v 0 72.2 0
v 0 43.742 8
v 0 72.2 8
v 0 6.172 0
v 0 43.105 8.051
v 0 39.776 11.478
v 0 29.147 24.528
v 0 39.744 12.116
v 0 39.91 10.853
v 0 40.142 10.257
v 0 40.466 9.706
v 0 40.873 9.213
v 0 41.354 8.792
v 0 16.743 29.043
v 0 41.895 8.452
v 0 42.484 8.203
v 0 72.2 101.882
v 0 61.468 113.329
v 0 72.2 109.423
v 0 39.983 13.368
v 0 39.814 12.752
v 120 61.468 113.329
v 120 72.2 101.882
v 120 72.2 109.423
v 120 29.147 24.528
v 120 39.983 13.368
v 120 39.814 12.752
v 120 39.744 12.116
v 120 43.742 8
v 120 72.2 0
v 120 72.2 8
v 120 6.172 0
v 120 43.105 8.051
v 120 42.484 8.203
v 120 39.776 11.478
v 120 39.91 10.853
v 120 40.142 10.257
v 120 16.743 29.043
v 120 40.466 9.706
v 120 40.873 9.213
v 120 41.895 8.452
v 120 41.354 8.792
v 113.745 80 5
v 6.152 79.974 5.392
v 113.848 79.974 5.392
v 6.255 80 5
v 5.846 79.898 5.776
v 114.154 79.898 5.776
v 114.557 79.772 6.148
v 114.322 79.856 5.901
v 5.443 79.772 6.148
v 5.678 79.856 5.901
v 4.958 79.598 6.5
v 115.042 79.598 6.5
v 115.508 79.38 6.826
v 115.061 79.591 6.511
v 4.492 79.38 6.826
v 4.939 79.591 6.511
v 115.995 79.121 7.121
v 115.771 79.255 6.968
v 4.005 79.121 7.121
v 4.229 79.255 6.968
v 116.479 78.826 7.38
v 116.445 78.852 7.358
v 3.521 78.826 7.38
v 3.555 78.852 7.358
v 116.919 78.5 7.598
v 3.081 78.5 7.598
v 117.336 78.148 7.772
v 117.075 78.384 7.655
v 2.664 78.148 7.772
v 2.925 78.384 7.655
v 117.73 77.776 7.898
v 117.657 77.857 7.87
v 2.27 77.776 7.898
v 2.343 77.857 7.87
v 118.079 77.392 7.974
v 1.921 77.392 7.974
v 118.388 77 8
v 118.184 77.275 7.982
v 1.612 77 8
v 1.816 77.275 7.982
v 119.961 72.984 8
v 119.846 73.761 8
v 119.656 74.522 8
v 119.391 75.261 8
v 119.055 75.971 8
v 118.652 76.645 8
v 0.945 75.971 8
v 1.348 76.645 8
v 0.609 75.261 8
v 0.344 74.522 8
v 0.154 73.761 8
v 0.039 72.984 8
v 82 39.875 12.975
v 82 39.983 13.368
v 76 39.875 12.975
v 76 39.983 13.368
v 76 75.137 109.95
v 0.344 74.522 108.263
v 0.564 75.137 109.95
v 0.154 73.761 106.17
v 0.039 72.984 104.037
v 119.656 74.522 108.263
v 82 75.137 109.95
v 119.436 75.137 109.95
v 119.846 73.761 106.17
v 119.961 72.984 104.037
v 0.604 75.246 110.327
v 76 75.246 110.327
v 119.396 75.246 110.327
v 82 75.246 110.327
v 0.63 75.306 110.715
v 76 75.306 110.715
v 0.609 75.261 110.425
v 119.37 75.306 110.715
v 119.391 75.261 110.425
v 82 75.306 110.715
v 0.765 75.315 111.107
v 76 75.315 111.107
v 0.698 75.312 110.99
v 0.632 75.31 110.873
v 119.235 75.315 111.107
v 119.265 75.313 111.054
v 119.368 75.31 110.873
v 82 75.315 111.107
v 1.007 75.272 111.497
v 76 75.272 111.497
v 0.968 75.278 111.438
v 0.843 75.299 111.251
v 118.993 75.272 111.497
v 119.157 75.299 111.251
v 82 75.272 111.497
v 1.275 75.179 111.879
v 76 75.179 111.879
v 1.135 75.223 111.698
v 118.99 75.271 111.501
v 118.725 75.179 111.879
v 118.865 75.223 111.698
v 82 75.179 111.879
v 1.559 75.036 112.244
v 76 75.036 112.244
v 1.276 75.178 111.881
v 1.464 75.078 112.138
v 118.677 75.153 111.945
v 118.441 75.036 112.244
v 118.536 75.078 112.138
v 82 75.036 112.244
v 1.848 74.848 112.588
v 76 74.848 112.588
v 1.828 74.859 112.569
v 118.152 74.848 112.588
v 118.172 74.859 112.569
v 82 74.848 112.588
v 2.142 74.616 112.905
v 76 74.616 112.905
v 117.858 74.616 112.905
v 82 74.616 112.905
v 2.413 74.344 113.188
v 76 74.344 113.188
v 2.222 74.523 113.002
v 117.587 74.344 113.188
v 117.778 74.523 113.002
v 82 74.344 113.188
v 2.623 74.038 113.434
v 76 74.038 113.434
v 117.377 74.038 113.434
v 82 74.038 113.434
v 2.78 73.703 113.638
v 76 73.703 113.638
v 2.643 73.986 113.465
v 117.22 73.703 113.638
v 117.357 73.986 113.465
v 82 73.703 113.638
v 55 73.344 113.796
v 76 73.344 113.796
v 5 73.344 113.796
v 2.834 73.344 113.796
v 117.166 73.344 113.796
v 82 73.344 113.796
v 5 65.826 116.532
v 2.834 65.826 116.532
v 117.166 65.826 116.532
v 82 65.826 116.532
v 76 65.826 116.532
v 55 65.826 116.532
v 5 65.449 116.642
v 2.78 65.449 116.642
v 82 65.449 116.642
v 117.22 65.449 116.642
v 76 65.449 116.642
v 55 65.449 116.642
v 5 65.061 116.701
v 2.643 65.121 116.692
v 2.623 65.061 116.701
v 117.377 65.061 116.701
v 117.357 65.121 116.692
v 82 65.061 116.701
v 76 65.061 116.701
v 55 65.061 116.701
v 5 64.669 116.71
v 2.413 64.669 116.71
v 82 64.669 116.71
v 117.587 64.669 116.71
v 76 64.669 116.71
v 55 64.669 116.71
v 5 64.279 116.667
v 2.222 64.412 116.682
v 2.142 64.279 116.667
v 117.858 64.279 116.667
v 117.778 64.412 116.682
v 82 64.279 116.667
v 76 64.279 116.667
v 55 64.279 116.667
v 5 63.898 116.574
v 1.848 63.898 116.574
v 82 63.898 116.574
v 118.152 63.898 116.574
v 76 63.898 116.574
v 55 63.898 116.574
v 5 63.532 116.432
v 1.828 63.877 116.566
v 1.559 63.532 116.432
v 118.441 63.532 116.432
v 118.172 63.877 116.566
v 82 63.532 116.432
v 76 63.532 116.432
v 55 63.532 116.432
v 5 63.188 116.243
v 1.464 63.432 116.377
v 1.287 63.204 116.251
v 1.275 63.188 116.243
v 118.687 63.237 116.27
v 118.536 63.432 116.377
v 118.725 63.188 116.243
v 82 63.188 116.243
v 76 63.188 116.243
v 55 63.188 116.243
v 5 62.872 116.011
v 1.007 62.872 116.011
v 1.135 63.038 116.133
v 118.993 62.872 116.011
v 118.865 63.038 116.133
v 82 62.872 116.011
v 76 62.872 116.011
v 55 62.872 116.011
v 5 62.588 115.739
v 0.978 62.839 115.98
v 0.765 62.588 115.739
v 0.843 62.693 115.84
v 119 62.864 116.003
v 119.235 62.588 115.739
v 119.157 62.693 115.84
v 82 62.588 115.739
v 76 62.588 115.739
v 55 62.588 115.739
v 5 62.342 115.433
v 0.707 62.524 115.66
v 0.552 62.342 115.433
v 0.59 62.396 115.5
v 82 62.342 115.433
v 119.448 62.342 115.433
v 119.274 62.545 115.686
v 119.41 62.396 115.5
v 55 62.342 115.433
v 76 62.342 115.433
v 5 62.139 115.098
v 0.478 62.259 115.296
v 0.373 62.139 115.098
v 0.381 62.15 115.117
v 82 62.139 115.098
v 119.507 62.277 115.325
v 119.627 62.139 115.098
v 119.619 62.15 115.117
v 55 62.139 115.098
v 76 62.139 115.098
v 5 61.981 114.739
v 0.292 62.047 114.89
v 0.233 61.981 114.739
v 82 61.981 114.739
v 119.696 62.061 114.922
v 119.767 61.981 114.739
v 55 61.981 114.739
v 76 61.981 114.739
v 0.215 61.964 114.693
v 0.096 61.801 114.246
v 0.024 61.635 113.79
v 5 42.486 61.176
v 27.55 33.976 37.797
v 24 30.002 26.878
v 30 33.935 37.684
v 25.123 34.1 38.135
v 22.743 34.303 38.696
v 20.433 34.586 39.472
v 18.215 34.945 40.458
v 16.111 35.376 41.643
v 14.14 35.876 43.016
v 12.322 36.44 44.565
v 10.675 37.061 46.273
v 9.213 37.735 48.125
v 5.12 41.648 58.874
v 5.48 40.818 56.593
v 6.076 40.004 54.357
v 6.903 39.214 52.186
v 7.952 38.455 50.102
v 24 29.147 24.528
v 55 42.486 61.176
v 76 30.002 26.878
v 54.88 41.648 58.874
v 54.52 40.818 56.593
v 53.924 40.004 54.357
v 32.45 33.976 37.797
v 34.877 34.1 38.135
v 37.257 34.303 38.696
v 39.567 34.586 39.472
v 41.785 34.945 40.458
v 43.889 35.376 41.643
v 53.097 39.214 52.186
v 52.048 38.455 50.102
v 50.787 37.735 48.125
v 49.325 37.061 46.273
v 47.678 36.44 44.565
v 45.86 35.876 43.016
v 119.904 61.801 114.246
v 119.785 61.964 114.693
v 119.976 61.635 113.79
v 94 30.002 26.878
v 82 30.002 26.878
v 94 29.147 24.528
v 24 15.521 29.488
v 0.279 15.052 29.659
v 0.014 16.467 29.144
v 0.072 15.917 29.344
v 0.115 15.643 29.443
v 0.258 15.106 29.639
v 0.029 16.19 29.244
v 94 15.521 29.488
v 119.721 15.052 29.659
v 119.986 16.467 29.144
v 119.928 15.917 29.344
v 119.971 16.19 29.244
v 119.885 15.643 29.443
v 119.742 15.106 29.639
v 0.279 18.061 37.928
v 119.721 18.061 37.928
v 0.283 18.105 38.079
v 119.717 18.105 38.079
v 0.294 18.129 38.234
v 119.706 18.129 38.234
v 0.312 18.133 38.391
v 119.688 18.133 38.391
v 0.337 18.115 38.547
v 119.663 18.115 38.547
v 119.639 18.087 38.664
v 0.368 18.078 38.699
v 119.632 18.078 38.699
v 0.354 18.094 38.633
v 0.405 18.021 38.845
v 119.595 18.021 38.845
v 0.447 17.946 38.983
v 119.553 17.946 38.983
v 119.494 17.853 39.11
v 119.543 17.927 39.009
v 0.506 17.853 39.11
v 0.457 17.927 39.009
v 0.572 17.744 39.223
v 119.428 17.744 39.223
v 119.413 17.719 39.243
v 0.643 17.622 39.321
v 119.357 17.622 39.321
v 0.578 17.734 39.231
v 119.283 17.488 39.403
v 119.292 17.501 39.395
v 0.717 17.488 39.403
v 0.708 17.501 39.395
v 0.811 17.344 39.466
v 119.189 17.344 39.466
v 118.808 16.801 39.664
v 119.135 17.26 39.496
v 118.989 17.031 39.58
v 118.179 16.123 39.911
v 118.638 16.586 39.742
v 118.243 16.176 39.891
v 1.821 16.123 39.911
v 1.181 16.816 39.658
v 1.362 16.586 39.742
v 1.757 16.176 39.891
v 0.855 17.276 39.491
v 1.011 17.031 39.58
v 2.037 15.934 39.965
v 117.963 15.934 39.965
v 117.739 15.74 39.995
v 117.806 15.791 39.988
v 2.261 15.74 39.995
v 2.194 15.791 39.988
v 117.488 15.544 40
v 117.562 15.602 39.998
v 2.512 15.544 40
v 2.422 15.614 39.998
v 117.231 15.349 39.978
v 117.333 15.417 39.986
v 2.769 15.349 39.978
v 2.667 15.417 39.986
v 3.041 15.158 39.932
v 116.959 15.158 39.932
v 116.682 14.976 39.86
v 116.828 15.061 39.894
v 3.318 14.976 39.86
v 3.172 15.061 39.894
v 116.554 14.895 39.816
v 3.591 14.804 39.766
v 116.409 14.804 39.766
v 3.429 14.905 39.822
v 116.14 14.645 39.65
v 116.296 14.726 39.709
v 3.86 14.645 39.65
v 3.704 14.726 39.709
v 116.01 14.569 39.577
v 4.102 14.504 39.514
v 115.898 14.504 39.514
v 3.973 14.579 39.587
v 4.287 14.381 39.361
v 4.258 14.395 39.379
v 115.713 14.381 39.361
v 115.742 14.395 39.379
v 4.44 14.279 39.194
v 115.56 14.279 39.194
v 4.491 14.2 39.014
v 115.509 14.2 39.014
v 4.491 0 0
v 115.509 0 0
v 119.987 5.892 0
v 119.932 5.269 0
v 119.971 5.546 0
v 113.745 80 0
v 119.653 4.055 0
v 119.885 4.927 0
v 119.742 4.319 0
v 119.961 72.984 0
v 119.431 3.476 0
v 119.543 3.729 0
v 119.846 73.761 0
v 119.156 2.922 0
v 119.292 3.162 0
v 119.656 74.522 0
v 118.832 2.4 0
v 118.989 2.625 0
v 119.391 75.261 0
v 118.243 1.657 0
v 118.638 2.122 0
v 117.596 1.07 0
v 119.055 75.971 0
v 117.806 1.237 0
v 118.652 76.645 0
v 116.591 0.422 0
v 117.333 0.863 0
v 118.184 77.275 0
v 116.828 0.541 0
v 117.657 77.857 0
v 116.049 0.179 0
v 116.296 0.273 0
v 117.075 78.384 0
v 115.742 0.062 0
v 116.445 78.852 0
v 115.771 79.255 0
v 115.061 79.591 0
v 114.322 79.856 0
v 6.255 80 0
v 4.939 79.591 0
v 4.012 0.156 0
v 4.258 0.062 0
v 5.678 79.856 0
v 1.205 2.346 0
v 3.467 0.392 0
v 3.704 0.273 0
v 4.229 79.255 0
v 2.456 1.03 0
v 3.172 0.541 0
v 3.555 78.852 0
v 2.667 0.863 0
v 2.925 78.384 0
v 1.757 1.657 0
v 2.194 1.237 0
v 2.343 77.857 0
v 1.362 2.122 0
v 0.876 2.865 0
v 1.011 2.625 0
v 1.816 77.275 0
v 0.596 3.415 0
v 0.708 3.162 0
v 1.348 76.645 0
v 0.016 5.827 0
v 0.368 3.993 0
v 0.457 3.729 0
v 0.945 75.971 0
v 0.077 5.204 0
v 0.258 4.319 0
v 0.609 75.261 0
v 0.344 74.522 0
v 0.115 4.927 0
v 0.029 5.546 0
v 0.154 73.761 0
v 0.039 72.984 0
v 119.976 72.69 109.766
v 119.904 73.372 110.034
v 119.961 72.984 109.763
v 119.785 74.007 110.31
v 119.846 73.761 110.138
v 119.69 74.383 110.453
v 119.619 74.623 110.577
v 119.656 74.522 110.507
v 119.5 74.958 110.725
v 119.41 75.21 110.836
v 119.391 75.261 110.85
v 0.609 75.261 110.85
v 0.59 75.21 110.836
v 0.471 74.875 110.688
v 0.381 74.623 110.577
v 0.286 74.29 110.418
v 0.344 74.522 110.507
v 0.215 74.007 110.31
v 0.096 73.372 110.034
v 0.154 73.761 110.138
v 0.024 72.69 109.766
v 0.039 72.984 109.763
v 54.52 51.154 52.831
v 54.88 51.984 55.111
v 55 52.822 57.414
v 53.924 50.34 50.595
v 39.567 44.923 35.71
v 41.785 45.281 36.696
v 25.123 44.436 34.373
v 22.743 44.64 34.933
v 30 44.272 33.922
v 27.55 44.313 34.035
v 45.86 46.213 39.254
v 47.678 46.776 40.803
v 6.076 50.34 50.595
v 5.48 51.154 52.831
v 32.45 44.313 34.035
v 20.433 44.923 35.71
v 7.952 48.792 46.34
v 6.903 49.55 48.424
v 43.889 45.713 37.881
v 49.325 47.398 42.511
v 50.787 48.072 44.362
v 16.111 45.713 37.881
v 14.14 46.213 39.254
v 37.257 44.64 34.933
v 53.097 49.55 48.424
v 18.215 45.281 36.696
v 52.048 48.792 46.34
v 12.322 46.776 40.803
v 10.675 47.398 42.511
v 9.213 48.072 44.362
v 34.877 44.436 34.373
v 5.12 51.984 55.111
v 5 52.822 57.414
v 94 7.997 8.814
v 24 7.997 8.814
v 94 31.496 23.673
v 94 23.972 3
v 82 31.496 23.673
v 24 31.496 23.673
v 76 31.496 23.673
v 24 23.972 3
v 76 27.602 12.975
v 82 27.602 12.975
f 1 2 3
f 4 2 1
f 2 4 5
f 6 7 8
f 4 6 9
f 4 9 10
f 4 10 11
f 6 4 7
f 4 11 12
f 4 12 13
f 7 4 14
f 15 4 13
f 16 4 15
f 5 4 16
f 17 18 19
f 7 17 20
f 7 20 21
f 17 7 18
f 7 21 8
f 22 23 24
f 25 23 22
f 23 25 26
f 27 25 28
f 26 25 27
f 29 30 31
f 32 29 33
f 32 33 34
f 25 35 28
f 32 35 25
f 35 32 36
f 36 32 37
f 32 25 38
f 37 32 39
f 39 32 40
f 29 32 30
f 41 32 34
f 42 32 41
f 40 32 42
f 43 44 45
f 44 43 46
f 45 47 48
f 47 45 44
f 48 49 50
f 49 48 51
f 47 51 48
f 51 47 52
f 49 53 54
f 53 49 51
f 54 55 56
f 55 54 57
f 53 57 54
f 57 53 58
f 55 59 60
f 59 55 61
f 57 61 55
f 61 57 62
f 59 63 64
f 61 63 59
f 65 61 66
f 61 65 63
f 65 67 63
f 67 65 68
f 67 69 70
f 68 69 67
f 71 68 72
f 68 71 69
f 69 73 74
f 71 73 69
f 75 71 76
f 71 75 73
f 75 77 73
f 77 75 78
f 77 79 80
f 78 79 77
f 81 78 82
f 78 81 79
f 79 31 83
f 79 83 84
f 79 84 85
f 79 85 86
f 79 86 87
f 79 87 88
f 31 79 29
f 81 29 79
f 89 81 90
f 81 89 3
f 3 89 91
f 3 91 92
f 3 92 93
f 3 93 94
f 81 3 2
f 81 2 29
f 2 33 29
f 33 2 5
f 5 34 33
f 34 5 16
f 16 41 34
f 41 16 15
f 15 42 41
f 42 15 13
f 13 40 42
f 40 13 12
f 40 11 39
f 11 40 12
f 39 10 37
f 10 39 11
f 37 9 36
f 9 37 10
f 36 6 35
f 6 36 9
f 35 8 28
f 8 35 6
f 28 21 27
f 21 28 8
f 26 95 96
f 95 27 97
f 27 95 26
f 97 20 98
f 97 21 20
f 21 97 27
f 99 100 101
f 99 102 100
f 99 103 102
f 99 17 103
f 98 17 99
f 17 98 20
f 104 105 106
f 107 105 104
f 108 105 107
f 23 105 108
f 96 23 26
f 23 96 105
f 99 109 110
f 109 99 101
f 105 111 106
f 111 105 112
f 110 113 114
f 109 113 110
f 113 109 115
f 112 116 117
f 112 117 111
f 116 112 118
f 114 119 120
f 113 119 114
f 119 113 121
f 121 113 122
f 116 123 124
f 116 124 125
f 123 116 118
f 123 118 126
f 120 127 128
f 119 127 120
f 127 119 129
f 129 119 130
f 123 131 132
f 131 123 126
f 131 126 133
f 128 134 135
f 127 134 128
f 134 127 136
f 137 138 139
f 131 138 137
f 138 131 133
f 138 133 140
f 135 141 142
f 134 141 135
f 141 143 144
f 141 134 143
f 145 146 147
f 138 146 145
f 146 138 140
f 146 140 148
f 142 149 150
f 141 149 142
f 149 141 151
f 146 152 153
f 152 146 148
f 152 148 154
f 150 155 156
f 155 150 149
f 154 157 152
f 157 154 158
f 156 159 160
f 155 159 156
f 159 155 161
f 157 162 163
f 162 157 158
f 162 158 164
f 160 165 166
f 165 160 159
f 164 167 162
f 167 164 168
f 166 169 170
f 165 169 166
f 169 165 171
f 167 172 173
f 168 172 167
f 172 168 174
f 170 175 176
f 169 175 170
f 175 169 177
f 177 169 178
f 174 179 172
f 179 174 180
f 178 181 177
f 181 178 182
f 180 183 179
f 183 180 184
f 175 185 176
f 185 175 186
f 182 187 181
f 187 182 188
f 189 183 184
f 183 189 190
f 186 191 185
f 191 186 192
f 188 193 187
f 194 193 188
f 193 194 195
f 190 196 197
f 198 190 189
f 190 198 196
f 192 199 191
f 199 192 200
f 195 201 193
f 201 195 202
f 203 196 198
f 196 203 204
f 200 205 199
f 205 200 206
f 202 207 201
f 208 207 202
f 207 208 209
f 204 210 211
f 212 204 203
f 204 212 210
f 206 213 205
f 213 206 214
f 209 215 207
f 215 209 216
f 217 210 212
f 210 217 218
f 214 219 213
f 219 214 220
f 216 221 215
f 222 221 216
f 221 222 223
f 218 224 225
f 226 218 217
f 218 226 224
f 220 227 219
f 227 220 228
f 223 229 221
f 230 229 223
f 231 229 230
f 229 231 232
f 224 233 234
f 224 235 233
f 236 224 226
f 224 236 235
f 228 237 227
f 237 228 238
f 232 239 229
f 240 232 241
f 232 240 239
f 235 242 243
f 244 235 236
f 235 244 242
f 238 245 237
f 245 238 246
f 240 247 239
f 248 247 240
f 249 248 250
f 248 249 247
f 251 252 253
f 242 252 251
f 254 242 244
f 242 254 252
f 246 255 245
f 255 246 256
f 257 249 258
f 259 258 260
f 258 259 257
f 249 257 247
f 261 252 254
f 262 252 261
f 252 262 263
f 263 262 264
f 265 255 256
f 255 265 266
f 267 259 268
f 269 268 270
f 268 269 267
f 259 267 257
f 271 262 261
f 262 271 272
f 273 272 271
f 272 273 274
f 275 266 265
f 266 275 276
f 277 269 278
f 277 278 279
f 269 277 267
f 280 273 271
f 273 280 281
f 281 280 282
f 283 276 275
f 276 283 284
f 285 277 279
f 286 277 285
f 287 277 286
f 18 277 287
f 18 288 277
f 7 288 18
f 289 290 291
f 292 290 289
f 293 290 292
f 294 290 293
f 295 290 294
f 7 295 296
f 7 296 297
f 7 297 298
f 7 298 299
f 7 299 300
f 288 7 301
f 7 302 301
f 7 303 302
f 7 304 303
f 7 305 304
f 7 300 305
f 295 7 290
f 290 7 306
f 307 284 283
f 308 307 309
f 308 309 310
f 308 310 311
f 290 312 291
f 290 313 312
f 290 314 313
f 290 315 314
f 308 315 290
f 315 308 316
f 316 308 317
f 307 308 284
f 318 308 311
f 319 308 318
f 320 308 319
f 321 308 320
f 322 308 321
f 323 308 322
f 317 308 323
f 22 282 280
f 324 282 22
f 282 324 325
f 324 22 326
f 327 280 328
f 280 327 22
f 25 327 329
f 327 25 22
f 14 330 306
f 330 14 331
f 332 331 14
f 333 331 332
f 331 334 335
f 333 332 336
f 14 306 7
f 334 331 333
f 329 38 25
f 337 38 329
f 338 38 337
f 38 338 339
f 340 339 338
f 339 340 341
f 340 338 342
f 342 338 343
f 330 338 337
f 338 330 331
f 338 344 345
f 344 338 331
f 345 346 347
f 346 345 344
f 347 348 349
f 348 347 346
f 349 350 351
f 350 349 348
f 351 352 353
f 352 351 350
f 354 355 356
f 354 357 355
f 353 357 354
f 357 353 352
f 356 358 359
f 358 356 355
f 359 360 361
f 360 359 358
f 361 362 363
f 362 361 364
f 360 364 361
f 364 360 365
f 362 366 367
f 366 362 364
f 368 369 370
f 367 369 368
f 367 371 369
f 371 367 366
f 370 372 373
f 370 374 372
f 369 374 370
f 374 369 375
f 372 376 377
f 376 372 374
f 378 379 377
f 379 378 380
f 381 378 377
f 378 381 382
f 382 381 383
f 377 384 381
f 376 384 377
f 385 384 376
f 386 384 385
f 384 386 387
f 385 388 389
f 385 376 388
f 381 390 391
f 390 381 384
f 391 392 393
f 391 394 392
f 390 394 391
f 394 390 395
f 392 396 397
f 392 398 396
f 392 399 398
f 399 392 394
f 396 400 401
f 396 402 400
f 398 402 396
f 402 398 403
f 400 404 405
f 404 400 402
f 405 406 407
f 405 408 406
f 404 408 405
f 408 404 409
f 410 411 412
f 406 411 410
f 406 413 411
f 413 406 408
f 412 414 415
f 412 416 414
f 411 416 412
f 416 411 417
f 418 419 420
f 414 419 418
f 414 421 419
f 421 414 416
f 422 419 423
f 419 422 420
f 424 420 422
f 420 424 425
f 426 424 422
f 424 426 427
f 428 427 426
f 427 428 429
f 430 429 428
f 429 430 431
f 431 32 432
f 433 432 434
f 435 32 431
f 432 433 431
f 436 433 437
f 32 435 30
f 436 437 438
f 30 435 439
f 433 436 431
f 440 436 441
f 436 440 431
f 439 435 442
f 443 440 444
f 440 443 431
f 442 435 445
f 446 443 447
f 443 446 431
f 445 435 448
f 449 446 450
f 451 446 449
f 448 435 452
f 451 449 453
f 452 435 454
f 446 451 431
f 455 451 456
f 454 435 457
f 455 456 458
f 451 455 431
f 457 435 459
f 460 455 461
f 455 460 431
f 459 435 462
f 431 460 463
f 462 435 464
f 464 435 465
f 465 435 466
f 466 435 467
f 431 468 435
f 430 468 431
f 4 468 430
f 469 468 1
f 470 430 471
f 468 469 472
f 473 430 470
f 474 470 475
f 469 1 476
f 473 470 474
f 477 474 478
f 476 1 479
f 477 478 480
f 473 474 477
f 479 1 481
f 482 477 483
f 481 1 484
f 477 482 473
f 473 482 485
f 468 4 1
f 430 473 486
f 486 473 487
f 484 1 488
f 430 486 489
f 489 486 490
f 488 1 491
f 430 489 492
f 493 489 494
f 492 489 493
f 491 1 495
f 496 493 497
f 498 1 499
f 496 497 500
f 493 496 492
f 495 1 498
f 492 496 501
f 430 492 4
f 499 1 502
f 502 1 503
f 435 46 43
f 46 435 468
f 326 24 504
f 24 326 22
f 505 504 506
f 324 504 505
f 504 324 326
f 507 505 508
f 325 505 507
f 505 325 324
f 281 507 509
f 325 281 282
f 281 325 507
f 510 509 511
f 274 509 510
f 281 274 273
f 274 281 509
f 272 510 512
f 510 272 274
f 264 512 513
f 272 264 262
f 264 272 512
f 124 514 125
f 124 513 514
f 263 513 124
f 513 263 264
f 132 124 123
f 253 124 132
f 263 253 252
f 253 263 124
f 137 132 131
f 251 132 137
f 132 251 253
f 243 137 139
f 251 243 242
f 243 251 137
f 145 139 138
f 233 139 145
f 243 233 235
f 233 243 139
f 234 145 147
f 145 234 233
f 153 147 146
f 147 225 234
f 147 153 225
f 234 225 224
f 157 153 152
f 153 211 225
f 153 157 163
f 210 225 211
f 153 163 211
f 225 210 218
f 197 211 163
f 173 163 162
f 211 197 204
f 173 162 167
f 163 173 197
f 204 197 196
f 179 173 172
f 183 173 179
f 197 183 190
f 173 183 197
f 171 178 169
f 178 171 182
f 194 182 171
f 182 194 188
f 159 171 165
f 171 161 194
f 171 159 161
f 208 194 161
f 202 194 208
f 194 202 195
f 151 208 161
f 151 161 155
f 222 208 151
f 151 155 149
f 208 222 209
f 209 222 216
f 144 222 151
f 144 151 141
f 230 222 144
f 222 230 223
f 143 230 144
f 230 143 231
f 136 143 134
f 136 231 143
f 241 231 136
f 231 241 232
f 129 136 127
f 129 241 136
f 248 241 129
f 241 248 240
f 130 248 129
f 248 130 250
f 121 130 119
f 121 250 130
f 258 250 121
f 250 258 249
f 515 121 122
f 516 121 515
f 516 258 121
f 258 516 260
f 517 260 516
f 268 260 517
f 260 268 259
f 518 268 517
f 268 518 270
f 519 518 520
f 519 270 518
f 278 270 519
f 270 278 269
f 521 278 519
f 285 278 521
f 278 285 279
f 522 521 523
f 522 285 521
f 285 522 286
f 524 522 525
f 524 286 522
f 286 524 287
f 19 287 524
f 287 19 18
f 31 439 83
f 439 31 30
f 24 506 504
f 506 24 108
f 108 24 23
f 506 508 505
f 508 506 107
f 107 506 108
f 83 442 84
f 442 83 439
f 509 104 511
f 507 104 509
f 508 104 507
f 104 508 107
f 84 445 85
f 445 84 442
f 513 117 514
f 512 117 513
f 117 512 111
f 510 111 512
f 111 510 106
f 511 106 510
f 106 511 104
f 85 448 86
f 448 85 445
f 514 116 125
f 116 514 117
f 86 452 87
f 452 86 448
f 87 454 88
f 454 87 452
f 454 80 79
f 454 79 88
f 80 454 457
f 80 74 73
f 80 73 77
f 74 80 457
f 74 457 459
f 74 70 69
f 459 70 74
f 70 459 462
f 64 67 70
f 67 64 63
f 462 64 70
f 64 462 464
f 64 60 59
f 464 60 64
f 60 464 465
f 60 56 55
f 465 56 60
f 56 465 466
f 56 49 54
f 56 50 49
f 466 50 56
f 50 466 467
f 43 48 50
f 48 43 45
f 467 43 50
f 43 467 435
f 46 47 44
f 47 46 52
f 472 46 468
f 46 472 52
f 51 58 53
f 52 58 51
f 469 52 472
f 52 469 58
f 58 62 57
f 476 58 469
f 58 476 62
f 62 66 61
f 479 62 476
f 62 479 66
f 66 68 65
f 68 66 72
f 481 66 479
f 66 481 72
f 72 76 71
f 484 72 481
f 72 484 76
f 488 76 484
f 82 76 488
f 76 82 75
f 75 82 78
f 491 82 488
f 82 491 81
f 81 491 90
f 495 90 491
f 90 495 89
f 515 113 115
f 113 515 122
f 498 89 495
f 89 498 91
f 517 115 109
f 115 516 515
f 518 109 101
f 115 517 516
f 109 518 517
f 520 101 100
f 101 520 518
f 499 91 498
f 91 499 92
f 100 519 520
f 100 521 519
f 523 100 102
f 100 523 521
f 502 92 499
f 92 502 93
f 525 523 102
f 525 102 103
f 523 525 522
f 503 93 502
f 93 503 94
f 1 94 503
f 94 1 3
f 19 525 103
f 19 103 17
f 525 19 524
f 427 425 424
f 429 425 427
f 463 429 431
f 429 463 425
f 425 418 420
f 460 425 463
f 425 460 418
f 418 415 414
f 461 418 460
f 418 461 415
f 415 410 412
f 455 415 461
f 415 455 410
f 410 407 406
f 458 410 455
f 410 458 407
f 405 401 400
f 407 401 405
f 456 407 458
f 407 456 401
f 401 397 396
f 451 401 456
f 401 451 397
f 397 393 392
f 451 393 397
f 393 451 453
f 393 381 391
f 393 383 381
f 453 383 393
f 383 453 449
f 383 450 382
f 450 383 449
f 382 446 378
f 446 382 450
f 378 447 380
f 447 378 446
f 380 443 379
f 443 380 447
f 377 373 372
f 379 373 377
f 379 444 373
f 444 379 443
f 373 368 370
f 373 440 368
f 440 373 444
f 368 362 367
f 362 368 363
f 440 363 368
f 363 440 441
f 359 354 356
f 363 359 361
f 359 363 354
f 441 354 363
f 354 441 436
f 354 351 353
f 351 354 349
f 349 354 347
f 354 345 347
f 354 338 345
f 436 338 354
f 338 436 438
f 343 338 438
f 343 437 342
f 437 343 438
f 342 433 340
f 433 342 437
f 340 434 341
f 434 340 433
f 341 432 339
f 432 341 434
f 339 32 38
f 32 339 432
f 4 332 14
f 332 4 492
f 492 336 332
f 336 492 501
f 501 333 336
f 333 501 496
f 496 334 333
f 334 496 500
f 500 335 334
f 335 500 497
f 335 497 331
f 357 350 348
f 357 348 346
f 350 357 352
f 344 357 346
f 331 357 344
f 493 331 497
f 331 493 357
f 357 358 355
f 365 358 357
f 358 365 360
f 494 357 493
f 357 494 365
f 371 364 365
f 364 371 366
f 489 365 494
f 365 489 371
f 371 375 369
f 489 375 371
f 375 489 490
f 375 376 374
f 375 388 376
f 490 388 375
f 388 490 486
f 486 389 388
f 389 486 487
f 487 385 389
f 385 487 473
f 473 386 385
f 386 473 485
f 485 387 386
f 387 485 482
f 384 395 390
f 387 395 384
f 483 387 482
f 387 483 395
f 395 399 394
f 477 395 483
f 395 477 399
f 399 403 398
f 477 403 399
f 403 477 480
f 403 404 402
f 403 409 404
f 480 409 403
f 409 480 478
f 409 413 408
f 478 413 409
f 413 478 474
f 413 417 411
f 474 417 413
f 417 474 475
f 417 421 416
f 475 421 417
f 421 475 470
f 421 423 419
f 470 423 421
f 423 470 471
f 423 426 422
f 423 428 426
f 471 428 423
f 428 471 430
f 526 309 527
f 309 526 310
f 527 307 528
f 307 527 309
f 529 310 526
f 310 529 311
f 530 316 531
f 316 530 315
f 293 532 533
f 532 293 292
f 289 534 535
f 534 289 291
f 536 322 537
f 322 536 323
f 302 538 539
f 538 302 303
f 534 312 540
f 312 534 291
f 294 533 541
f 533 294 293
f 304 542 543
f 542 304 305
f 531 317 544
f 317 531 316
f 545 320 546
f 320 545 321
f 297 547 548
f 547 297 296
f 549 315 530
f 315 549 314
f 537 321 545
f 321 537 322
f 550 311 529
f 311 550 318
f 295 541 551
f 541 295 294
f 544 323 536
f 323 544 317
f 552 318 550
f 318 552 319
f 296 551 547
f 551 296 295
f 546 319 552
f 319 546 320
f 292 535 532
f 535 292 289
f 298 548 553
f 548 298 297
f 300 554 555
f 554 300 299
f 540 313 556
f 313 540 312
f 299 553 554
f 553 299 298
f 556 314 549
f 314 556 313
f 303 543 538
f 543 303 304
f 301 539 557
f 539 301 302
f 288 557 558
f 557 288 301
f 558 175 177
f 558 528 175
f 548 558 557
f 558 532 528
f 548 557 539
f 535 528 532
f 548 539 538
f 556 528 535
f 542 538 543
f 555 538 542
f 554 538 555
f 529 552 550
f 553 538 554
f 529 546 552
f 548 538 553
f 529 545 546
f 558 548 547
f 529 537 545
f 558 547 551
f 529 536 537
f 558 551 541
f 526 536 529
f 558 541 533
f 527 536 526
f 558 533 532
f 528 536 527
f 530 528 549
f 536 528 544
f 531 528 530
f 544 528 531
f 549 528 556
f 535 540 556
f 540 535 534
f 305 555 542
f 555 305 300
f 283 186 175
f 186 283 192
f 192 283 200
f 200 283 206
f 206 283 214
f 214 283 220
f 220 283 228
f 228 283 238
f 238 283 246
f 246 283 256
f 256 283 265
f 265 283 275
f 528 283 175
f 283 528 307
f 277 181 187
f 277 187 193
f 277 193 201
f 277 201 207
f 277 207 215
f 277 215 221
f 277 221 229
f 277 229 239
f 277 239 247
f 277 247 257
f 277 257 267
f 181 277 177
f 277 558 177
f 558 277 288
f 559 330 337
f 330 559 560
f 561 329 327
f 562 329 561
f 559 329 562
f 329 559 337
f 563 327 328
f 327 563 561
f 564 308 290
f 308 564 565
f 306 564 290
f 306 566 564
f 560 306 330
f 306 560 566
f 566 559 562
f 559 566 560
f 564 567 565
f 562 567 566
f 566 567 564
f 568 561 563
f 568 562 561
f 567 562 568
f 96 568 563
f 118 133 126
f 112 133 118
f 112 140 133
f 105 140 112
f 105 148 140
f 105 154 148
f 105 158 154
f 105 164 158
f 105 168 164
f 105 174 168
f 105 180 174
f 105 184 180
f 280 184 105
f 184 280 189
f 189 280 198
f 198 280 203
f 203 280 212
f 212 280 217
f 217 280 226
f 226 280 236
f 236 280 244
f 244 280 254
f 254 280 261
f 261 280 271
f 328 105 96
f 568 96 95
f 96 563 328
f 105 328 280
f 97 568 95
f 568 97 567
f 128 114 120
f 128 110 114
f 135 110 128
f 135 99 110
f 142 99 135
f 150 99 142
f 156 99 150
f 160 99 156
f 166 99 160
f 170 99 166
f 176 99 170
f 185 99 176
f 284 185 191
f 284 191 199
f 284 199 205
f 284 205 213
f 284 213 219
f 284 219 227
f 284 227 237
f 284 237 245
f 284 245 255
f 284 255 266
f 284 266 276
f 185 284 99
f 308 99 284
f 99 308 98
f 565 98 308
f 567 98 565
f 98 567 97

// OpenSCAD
// Ladeständer für PocketBook Era Color (mit Hülle + Popsocket), Gerät quer,
// Ladebuchse unten, gewinkelter USB-C-Stecker hängt frei in einem Schacht
// Alle Maße in Millimetern (Regel: units-mm)
//
// Änderungen gegenüber _002 (QA-Befunde _002):
//   - Befund 1: R10 senkrecht bis zum ENDE DER GERADEN Anlagefläche gemessen
//     (Kopfrundung abgezogen). back_h 97 -> 99 -> 90.2 mm senkrecht, per
//     assert geprüft; das echo misst jetzt dasselbe (vorher bis zur
//     ungerundeten Ecke: 91.15 behauptet, real 88.3).
//   - Befund 2: Grate an den Wandköpfen neben der Tasche. Radius hinten am
//     Stützenkopf 4 -> 3 (= Restwand hinter der Tasche), seitlicher Kopfradius
//     8 -> 5 (= Rand links der Tasche). Die Bögen laufen jetzt tangential in
//     die Taschenwand statt in einen Grat; per assert gekoppelt.
//   - Befund 3 (R16 erweitert): vordere Ecken des Fußblocks und die
//     Lippenenden gerundet (r 6, Draufsicht senkrecht zur Gerätefläche, also
//     entlang der 70°-Front; die Rundungsfläche hat keinen Überhang).
//
// Änderungen in _002 gegenüber _001 (QA-Befunde + Nutzerwunsch "abgerundete Ecken"):
//   - Befund 1: Kante hinten am Schacht (Stütze hing 2.5 mm über) mit 45° im
//     Gerätesystem angefast -> ~25° aus der Senkrechten, kein Überhang mehr.
//   - Befund 2: back_h 95 -> 97, damit R10 auch senkrecht gilt (97 * sin70 = 91.2).
//   - Befund 3/4: Reserve. shaft_d 20 -> 22, Popsocket-Luft seitlich/unten
//     3 -> 5 (Tasche 50 breit), hinten 2 -> 4 (Tasche 11 tief), dafür
//     back_t 12 -> 14 (Rest hinter der Tasche bleibt 3). Tasche unten rund
//     (U-Form, folgt dem Popsocket).
//   - Befund 6: Ständermasse zieht Schacht, Kanal und Tasche ab (vorher nur
//     die volle Profilfläche).
//   - Abgerundet: Profilecken (Lippe oben, Stützenkopf, Fußplatte hinten,
//     Hohlkehle Stütze/Fußplatte), Stützenkopf seitlich (Vorderansicht),
//     hintere Ecken der Fußplatte (Draufsicht). Nicht gerundet: Kanten am
//     Bett (kein Überhang am Fuß) und die Auflage/Schlitzecken (dort sitzt
//     die Gerätekante).
//
// Kontext (Regel: context-first):
//   - context/printer.md:    Anycubic Kobra S1, 0.4mm Düse, PEI, 250mm Bauraum
//   - context/tolerances.md: kein Passsitz im Teil. Geräteschlitz bewusst
//                            locker (+1 mm/Seite), Stecker/Kabel mit viel Luft.
//   - context/materials.md:  PLA, Rechenwerte (Dichte 1.24, Füllung ~0.6)
//
// ---------------------------------------------------------------------------
// ANFORDERUNGSTABELLE (Design-Gespräch, vom Nutzer bestätigt)
// ---------------------------------------------------------------------------
// | ID  | Anforderung                         | Soll                                   | Quelle        | Prüfmethode                          |
// |-----|-------------------------------------|----------------------------------------|---------------|--------------------------------------|
// | R1  | Gerät quer: 162 br. x 145 h x 13 d  | Aufnahme passend, Gerät darf seitlich   | 145 gemessen, | Bounding Box, Schnitte               |
// |     |                                     | überstehen                             | 162 geschätzt,|                                      |
// |     |                                     |                                        | 13 ca. gem.   |                                      |
// | R2  | Schlitz für die Dicke               | 15 mm (+1/-0), locker                  | ca. gemessen  | Schnitt quer                         |
// | R3  | Neigung                             | 70° ±1° gegen den Tisch                | Nutzer        | Schnitt quer, Winkel                 |
// | R4  | Gerät auf zwei Auflagen, nicht auf  | Schacht unter der Buchse 70 mm lang (X)| angenommen    | Schnitt z = Auflagehöhe              |
// |     | dem Stecker                         | x 17 mm tief (quer zum Gerät)          |               |                                      |
// | R5  | Buchsenposition                     | Mitte ~80 mm vom linken Ende, mittig   | geschätzt     | Schacht zentriert darauf             |
// |     |                                     | in der Dicke                           |               |                                      |
// | R6  | Freiraum Winkelstecker              | Schachttiefe unter dem Gerät >= 20 mm  | angenommen    | Schnitt, Kollisionsteil Stecker      |
// |     |                                     | (Stecker ~15 lang, 12 x 7)             |               |                                      |
// | R7  | Kabelkanal oben offen, nach hinten  | Breite >= 5 mm, Kabel von oben einlegbar| angenommen   | Schnitt, Sichtprüfung                |
// | R8  | Popsocket frei: Ø40 x 7, Mitte 39   | Aussparung >= Ø46, Tiefe >= 9          | geschätzt     | Schnitt, Kollisionsteil              |
// |     | über Unterkante, 51 vom linken Ende |                                        |               |                                      |
// | R9  | Lippe vorne hält die Unterkante     | ~10 mm hoch                            | angenommen    | Schnitt quer                         |
// | R10 | Rückenstütze trägt über dem Schwer- | gerade Anlagefläche endet >= 90 mm     | angenommen    | Schnitt quer                         |
// |     | punkt                               | SENKRECHT über der Auflage (_003)      |               |                                      |
// | R11 | Kippsicher, nur Laden               | Kippwinkel vorne und hinten >= 15°,    | angenommen    | echo(), load-case-check              |
// |     |                                     | mit 330 g                              |               |                                      |
// | R12 | PLA, ohne Stützen druckbar          | Überhang <= 45°, Wände >= 0.8 mm       | Nutzer        | G4                                   |
// | R13 | Druckraum                           | <= 250 x 250 x 250                     | Drucker       | Bounding Box                         |
// | R14 | Teile im print                      | 1 Volumen                              | -             | check.py Volumes                     |
// | R15 | Passtest                            | Teil fit_test: Sockelausschnitt mit    | -             | Druck vor dem ganzen Teil            |
// |     |                                     | Schacht, Kanal, Auflagen               |               |                                      |
// | R16 | Abgerundete Ecken (Nutzer, _002/003)| sichtbare Außenecken gerundet, inkl.   | Nutzer        | Sichtprüfung (G3), Schnitte          |
// |     |                                     | vordere Ecken/Lippenenden; scharf:     |               |                                      |
// |     |                                     | Bettkanten, Auflage/Schlitz, Kanten an |               |                                      |
// |     |                                     | Schacht/Kanal/Tasche, lange Seiten-    |               |                                      |
// |     |                                     | kanten; keine Grate < 0.8 mm           |               |                                      |
//
// Stecker: UGREEN 60W USB-C Winkel 90°. Herstellermaße nicht gefunden ->
// plug_* und cable_d sind ANNAHMEN. Annahme: das Kabel geht parallel zur
// Geräteunterkante ab (X). Steckerseite so wählen, dass es nach rechts
// (zum Kanal) abgeht – USB-C ist verdrehbar.
//
// ---------------------------------------------------------------------------
// Koordinaten
// ---------------------------------------------------------------------------
// X = Breite (x = 0 am linken Ende des Geräts, von vorne gesehen),
// Y = Tiefe (y = 0 Vorderkante Fuß, +Y nach hinten), Z = Höhe.
// Gerätesystem (n, u): u entlang der Gerätefläche nach oben (um tilt nach
// hinten geneigt), n senkrecht dazu nach hinten. Ursprung O = Schnitt von
// Lippen-Innenseite und Auflage. Der Schlitz reicht von n = 0 (Lippe) bis
// n = slot_w (Rückenstütze); das Gerät lehnt an der Stütze.
//
// Aufbau: ein Profil in (Y, Z), über stand_w in X extrudiert:
//   Fuß vorne (massiv unter dem Schlitz), Lippe, Auflage senkrecht zur
//   Gerätefläche, geneigte Rückenstütze als Platte, flache Fußplatte nach
//   hinten. Ausgeschnitten: Steckerschacht unter der Buchse, Kabelkanal
//   (oben offen) nach hinten, Popsocket-Tasche (oben offen) in der Stütze.
//
// Druckausrichtung (part = "print"): so wie er steht, Fußunterseite aufs
// Bett. Keine Brücken (Schacht, Kanal und Tasche sind oben offen). Stärkster
// Überhang: Lippen-Innenseite und Rückseite der Stütze, je tilt = 20° aus
// der Senkrechten.
//
// LASTFÄLLE (rule load-case-check): Das Teil wird nicht bedient, nur
// abgestellt. Bruch unkritisch (330 g auf ~12 mm PLA-Platte, Spannungen
// << 1 MPa). Rutschen unkritisch (Lippe hält formschlüssig). Maßgebend ist
// Kippen, nach hinten (Anstoßen an der Geräteoberkante). echo() unten.

/* [Gerät] */
// Breite quer (lange Kante, mit Hülle) – GESCHÄTZT
dev_w = 162;
// Höhe quer (kurze Kante, mit Hülle) – gemessen
dev_h = 145;
// Dicke mit Hülle, ohne Popsocket – ca. gemessen
dev_t = 13;
// Masse Gerät + Hülle in g – ANNAHME (nur echo)
dev_mass_g = 330;

/* [Popsocket (Rückseite, eingeklappt)] */
pop_d = 40;
pop_h = 7;
// Mitte vom linken Ende (Frontansicht)
pop_x = 51;
// Mitte über der Geräteunterkante
pop_u = 39;
// Luft ringsum in der Tasche
pop_clear = 5;
// Luft hinter dem Popsocket
pop_clear_back = 4;

/* [Buchse und Winkelstecker – ANNAHMEN] */
// Buchsenmitte vom linken Ende
port_x = 80;
// Steckergehäuse: Breite (X), Dicke (n), Länge aus dem Gerät
plug_w = 12;
plug_t = 7;
plug_l = 15;
cable_d = 4;

/* [Ständer] */
// Neigung gegen den Tisch
stand_angle = 70;
// Luft im Schlitz gesamt (Schlitz = dev_t + slot_clear)
slot_clear = 2;
// Breite des Ständers (X), mittig unter dem Gerät
stand_w = 120;
// Lippe vorne: Dicke, Höhe über der Auflage
lip_t = 4;
lip_h = 10;
// Rückenstütze: Anlagehöhe über der Auflage, Plattendicke
back_h = 99;
back_t = 14;
// Fußplatte hinten: Gesamttiefe des Fußes, Höhe
base_d = 80;
base_h = 8;
// Boden unter dem tiefsten Punkt des Schachts
floor_t = 3;

/* [Schacht und Kanal] */
shaft_l = 70;
shaft_w = 17;
shaft_d = 22;
// Kanal nach hinten: X-Position (rechts neben dem Stecker, Platz zum Biegen)
channel_x = 100;
channel_w = 6;

/* [Ansicht] */
part = "print"; // [print, stand, fit_test, assembly, interference]

/* [Hidden] */
nozzle = 0.4;
min_w = 2 * nozzle;
bed = 250;
rho_pla = 1.24;   // g/cm³
fill = 0.6;       // effektive Füllung für Massenschätzung
eps = 0.01;
col_stand = "MidnightBlue";
$fn = 64;

tilt = 90 - stand_angle;       // Neigung aus der Senkrechten
s = sin(tilt);
c = cos(tilt);
slot_w = dev_t + slot_clear;
n_dev0 = slot_w - dev_t;       // Gerät lehnt an der Stütze
n_plug = n_dev0 + dev_t / 2;   // Buchse mittig in der Dicke
// Schachtvorderwand nie genau in der Ebene der Lippen-Innenseite (n = 0):
// koplanare Flächen ergeben Null-Dreiecke in der STL (F7)
shaft_n0 = max(n_plug - shaft_w / 2, 0.5);
shaft_n1 = shaft_n0 + shaft_w;
n_rear = slot_w + back_t;      // Rückseite der Stütze
sx0 = (dev_w - stand_w) / 2;   // Ständer mittig unter dem Gerät
sx1 = sx0 + stand_w;

// Ursprung O: tiefster Schachtpunkt (n = shaft_n1, u = -shaft_d) liegt auf
// z = floor_t; Lippen-Vorderkante trifft den Tisch bei y = 0.
Oz = floor_t + shaft_n1 * s + shaft_d * c;
u_a = -(Oz + lip_t * s) / c;
Oy = lip_t * c - u_a * s;

function F(n, u) = [Oy + n * c + u * s, Oz - n * s + u * c];

u_J = (base_h - Oz + n_rear * s) / c;   // Stützen-Rückseite trifft Fußplatte
PROFILE = [
    [0, 0], [base_d, 0], [base_d, base_h],
    F(n_rear, u_J), F(n_rear, back_h), F(slot_w, back_h),
    F(slot_w, 0), F(0, 0), F(0, lip_h), F(-lip_t, lip_h)
];
// Eckradien je Profilpunkt (R16). 0 = scharf: Bettkanten (kein Überhang)
// und Auflage/Schlitz (dort sitzt die Gerätekante). J = Hohlkehle.
//            A  R1 R2 J  H  G  E  D  C    B
PROFILE_RAD = [0, 0, 3, 4, 3, 3, 0, 0, 1.2, 1.5];
// Seitliche Rundung Stützenkopf (Vorderansicht), hintere Fußecken (Draufsicht),
// vordere Ecken/Lippenenden (Ansicht senkrecht zur Gerätefläche)
top_corner_r = 5;
foot_corner_r = 8;
front_corner_r = 6;

// Ecke i mit Radius r durch einen Kreisbogen ersetzen (konvex und konkav)
function unit(v) = v / norm(v);
function round_corner(P, i, r, k = 12) =
    let(a = P[(i - 1 + len(P)) % len(P)], p = P[i], b = P[(i + 1) % len(P)],
        u1 = unit(a - p), u2 = unit(b - p),
        th = acos(u1 * u2) / 2,
        t = r / tan(th),
        C = p + unit(u1 + u2) * r / sin(th),
        T1 = p + u1 * t, T2 = p + u2 * t,
        a1 = atan2(T1[1] - C[1], T1[0] - C[0]),
        a2 = atan2(T2[1] - C[1], T2[0] - C[0]),
        d0 = a2 - a1,
        d = d0 > 180 ? d0 - 360 : (d0 < -180 ? d0 + 360 : d0))
    [for (j = [0 : k]) C + r * [cos(a1 + d * j / k), sin(a1 + d * j / k)]];
// Tangentenlänge je Ecke, für die Kontrolle "Radien passen auf die Kante"
function tan_len(P, i, r) =
    let(a = P[(i - 1 + len(P)) % len(P)], p = P[i], b = P[(i + 1) % len(P)])
    r / tan(acos(unit(a - p) * unit(b - p)) / 2);
function round_poly(P, R) =
    [for (i = [0 : len(P) - 1]) each (R[i] > 0 ? round_corner(P, i, R[i]) : [P[i]])];
PROFILE_R = round_poly(PROFILE, PROFILE_RAD);

// Kabel verlässt den Stecker knapp über dessen Ende, Kanalboden darunter
cab_u = -plug_l + cable_d / 2 + 1;
cab_P = F(n_plug, cab_u);
channel_z0 = cab_P[1] - cable_d / 2 - 0.5;
channel_y0 = F(0, lip_h)[0] + 0.5;      // hinter der Lippe, schneidet sie nicht

pocket_w = pop_d + 2 * pop_clear;
pocket_dep = pop_h + pop_clear_back;
pocket_x0 = pop_x - pocket_w / 2;
pocket_x1 = pop_x + pocket_w / 2;

// Polygonfläche und Schwerpunkt (Shoelace)
function sumv(v, i = 0) = i >= len(v) ? 0 : v[i] + sumv(v, i + 1);
function cr(P, i) = let(a = P[i], b = P[(i + 1) % len(P)]) a[0] * b[1] - b[0] * a[1];
function parea(P) = sumv([for (i = [0 : len(P) - 1]) cr(P, i)]) / 2;
function pcent(P) = let(A = parea(P)) [
    sumv([for (i = [0 : len(P) - 1]) (P[i][0] + P[(i + 1) % len(P)][0]) * cr(P, i)]) / (6 * A),
    sumv([for (i = [0 : len(P) - 1]) (P[i][1] + P[(i + 1) % len(P)][1]) * cr(P, i)]) / (6 * A)];
// Polygon an der Halbebene p[ax] >= k abschneiden (Sutherland-Hodgman)
function clip_ge(P, ax, k) =
    [for (i = [0 : len(P) - 1])
        let(p = P[i], q = P[(i + 1) % len(P)], pin = p[ax] >= k, qin = q[ax] >= k)
        each concat(pin ? [p] : [],
                    pin != qin ? [p + (q - p) * ((k - p[ax]) / (q[ax] - p[ax]))] : [])];

// Schacht mit 45°-Fase (Gerätesystem n, u): Rechteck unter der Auflage plus
// Dreieck hinten, das die überstehende Stützenkante abträgt (QA-Befund 1)
ch_d = shaft_n1 - slot_w;   // Überstand der Stütze über dem Schacht
SHAFT_NU = [[shaft_n0, -shaft_d], [shaft_n1, -shaft_d], [shaft_n1, 0],
            [slot_w, ch_d], [shaft_n0, ch_d]];
// Anteil des Schachts, der im Material liegt (ohne den leeren Schlitz)
SHAFT_MAT = [for (p = [[shaft_n0, -shaft_d], [shaft_n1, -shaft_d], [shaft_n1, 0],
                       [slot_w, ch_d], [slot_w, 0], [shaft_n0, 0]]) F(p[0], p[1])];

// ---------------------------------------------------------------------------
// Kontrollen
// ---------------------------------------------------------------------------
assert(abs(slot_w - 15) <= 1 && slot_w >= 15, str("R2: Schlitz ", slot_w));
assert(stand_angle >= 60 && stand_angle <= 80, "Neigung unplausibel");
assert(stand_w <= dev_w, "R1: Ständer breiter als das Gerät");
assert(shaft_n0 >= -eps && shaft_n1 <= n_rear - min_w, "Schacht ragt aus Lippe/Stütze");
assert(shaft_d >= plug_l + 5, str("R6: Schacht zu flach für den Stecker: ", shaft_d));
assert(shaft_w >= plug_t + 2 * 2 && shaft_w >= cable_d + 2 * 2, "Schacht zu schmal");
assert(port_x - shaft_l / 2 >= sx0 + 10 && port_x + shaft_l / 2 <= sx1 - 10,
       "R4: Auflagen neben dem Schacht < 10 mm");
assert(shaft_l / 2 - plug_w / 2 >= 8, "R5: Schacht deckt Lageunsicherheit ±8 nicht ab");
assert(channel_x + channel_w / 2 <= port_x + shaft_l / 2 - 2, "Kanal liegt nicht am Schacht");
assert(channel_x - channel_w / 2 >= port_x + plug_w / 2 + 4, "Kanal zu nah am Stecker (Biegung)");
assert(channel_w >= cable_d + 1 && channel_w >= 5, "R7: Kanal zu schmal");
assert(channel_z0 >= floor_t, str("Kanalboden unter Bodenstärke: ", channel_z0));
assert(pocket_x0 >= sx0 + 2 * min_w, "Popsocket-Tasche schneidet die linke Ständerkante");
assert(pocket_x1 <= channel_x - channel_w / 2 - 2 * min_w, "Tasche zu nah am Kanal");
assert(back_t - pocket_dep >= 2 * min_w, str("Rest hinter der Tasche: ", back_t - pocket_dep));
assert(pop_u - pocket_w / 2 > 0 && pop_u + pocket_w / 2 < dev_h, "Popsocket außerhalb Gerät");
assert(back_h >= 90 && back_h < dev_h, "R10: Anlagehöhe");
assert(lip_t >= 2 * min_w && lip_h >= 8, "R9: Lippe");
assert(F(n_rear, u_J)[0] < base_d - 10, "Fußplatte hinter der Stütze zu kurz");
for (i = [0 : len(PROFILE) - 1]) if (PROFILE_RAD[i] > 0) {
    // Tangentenlängen benachbarter Ecken dürfen sich auf einer Kante nicht
    // überschneiden, sonst läuft die Kontur zurück
    j = (i + 1) % len(PROFILE);
    assert(tan_len(PROFILE, i, PROFILE_RAD[i]) + tan_len(PROFILE, j, PROFILE_RAD[j])
           <= norm(PROFILE[j] - PROFILE[i]) - 0.2, str("R16: Radius an Ecke ", i, " zu groß"));
    k = (i - 1 + len(PROFILE)) % len(PROFILE);
    assert(tan_len(PROFILE, i, PROFILE_RAD[i]) + tan_len(PROFILE, k, PROFILE_RAD[k])
           <= norm(PROFILE[k] - PROFILE[i]) - 0.2, str("R16: Radius an Ecke ", i, " zu groß"));
}
assert(foot_corner_r < base_d - F(n_rear, u_J)[0] && front_corner_r < port_x - shaft_l / 2 - sx0,
       "Eckradien zu groß");
// Kein Grat an den Wandköpfen neben der Tasche (QA _002 Befund 2): die Radien
// dürfen höchstens so groß sein wie die Wand, in die sie laufen
assert(top_corner_r <= pocket_x0 - sx0, str("Kopfradius seitlich > Rand links der Tasche: ",
       top_corner_r, " > ", pocket_x0 - sx0));
assert(PROFILE_RAD[4] <= back_t - pocket_dep, str("Kopfradius hinten > Restwand hinter der Tasche: ",
       PROFILE_RAD[4], " > ", back_t - pocket_dep));
// R10: gerade Anlagefläche endet dort, wo die Kopfrundung G beginnt
u_contact = back_h - tan_len(PROFILE, 5, PROFILE_RAD[5]);
contact_vert = F(slot_w, u_contact)[1] - F(slot_w, 0)[1];
assert(contact_vert >= 90, str("R10: Anlage senkrecht nur ", contact_vert, " mm"));
// Fase: Fläche im Gerätesystem 45° -> Winkel aus der Senkrechten in Weltkoordinaten
chamfer_vert = atan((ch_d * c - ch_d * s) / (ch_d * s + ch_d * c));
assert(chamfer_vert <= 45, str("R12: Schachtfase ", chamfer_vert, "° aus der Senkrechten"));
assert(max([for (p = PROFILE) p[0]]) <= bed && stand_w <= bed &&
       max([for (p = PROFILE) p[1]]) <= bed, "R13: größer als Bauraum");

// ---------------------------------------------------------------------------
// Kippen (R11). Konservativ: nur Gerät. Zusätzlich mit Ständermasse:
// Profil x Breite minus Schacht, Kanal und Tasche (QA-Befund 6). Die
// Eckrundungen in Vorder- und Draufsicht sind vernachlässigt (< 1 cm³).
// ---------------------------------------------------------------------------
function vol_cg(A, cg, w) = [abs(A) * w, cg];   // [mm³, [y, z]]
V_prof = vol_cg(parea(PROFILE_R), pcent(PROFILE_R), stand_w);
V_shaft = vol_cg(parea(SHAFT_MAT), pcent(SHAFT_MAT), shaft_l);
CH_PROF = clip_ge(clip_ge(PROFILE_R, 0, channel_y0), 1, channel_z0);
CH_SHAFT = clip_ge(clip_ge(SHAFT_MAT, 0, channel_y0), 1, channel_z0);
V_ch = [channel_w * (abs(parea(CH_PROF)) - abs(parea(CH_SHAFT))),
        (pcent(CH_PROF) * abs(parea(CH_PROF)) - pcent(CH_SHAFT) * abs(parea(CH_SHAFT)))
            / (abs(parea(CH_PROF)) - abs(parea(CH_SHAFT)))];
pr = pocket_w / 2;
pA1 = pocket_w * (back_h - pop_u);
pA2 = PI * pr * pr / 2;
p_uc = (pA1 * (pop_u + back_h) / 2 + pA2 * (pop_u - 4 * pr / (3 * PI))) / (pA1 + pA2);
V_pocket = [(pA1 + pA2) * pocket_dep, F(slot_w + pocket_dep / 2, p_uc)];
st_vol = V_prof[0] - V_shaft[0] - V_ch[0] - V_pocket[0];
st_cg = (V_prof[1] * V_prof[0] - V_shaft[1] * V_shaft[0] - V_ch[1] * V_ch[0]
         - V_pocket[1] * V_pocket[0]) / st_vol;
st_mass_g = st_vol / 1000 * rho_pla * fill;
dev_cg = F(n_dev0 + dev_t / 2, dev_h / 2);
tot_mass = dev_mass_g + st_mass_g;
tot_cg = (dev_cg * dev_mass_g + st_cg * st_mass_g) / tot_mass;
dev_top = F(n_dev0, dev_h);
tip_f_dev = atan(dev_cg[0] / dev_cg[1]);
tip_b_dev = atan((base_d - dev_cg[0]) / dev_cg[1]);
tip_f_tot = atan(tot_cg[0] / tot_cg[1]);
tip_b_tot = atan((base_d - tot_cg[0]) / tot_cg[1]);
push_b_g = tot_mass * (base_d - tot_cg[0]) / dev_top[1];   // horizontal an der Geräteoberkante
assert(tip_f_dev >= 15 && tip_b_dev >= 15,
       str("R11: Kippwinkel (nur Gerät) vorne ", tip_f_dev, "° hinten ", tip_b_dev, "°"));

echo(str("Schlitz ", slot_w, " mm, Neigung ", stand_angle, "°, Auflage auf z = ", Oz, " (vorne) bis ", F(slot_w, 0)[1]));
echo(str("Ständer: ", stand_w, " x ", base_d, " x ", max([for (p = PROFILE_R) p[1]]), " mm, Volumen ~",
         st_vol / 1000, " cm³, Masse ~", st_mass_g, " g (Füllung ", fill, ", Schätzung)"));
echo(str("Schacht ", shaft_l, " x ", shaft_w, " x ", shaft_d, ", Fase ", ch_d, " mm, ", chamfer_vert, "° aus der Senkrechten"));
echo(str("Tasche ", pocket_w, " breit, ", pocket_dep, " tief, Boden bei u = ", pop_u - pocket_w / 2,
         "; gerade Anlage bis u = ", u_contact, " (entlang), senkrecht ", contact_vert, " mm über der Auflage"));
echo(str("Kippen nur Gerät: vorne ", tip_f_dev, "°, hinten ", tip_b_dev, "°"));
echo(str("Kippen mit Ständer: vorne ", tip_f_tot, "°, hinten ", tip_b_tot, "°"));
echo(str("Schub an der Geräteoberkante nach hinten bis Kippen: ~", push_b_g, " g"));
echo(str("Kanal: x = ", channel_x, ", Boden z = ", channel_z0, ", Rest hinter Tasche ", back_t - pocket_dep, " mm"));

// ---------------------------------------------------------------------------
// Geometrie
// ---------------------------------------------------------------------------
// Gerätesystem: lokal x -> X, y -> n, z -> u
module in_dev() {
    multmatrix([[1, 0, 0, 0], [0, c, s, Oy], [0, -s, c, Oz], [0, 0, 0, 1]]) children();
}

module profile_solid() {
    translate([sx0, 0, 0]) rotate([90, 0, 90])
        linear_extrude(height = stand_w) polygon(PROFILE_R);
}

// Stützenkopf seitlich gerundet, Vorderansicht (x, u). Bogenmitte 0.5 über
// der Oberkante, damit keine Fläche genau auf der Kopffläche liegt (F7).
module top_round_2d() {
    r = top_corner_r;
    translate([sx0 - 10, -200]) square([stand_w + 20, 200 + back_h + 0.5 - r]);
    hull() {
        translate([sx0 + r, back_h + 0.5 - r]) circle(r = r);
        translate([sx1 - r, back_h + 0.5 - r]) circle(r = r);
    }
    translate([sx0 + r, back_h + 0.5 - r]) square([stand_w - 2 * r, r + 30]);
}
// Hintere Fußecken gerundet, Draufsicht (x, y)
module foot_round_2d() {
    r = foot_corner_r;
    translate([sx0 - 10, -10]) square([stand_w + 20, base_d + 10 - r + 0.2]);
    hull() {
        translate([sx0 + r, base_d + 0.2 - r]) circle(r = r);
        translate([sx1 - r, base_d + 0.2 - r]) circle(r = r);
    }
}
// Vordere Ecken und Lippenenden, Schnitt senkrecht zur Gerätefläche (x, n),
// entlang u extrudiert: die Front ist die Ebene n = -lip_t. Bogenmitte 0.2
// vor der Front (F7, s. o.).
module front_round_2d() {
    r = front_corner_r;
    n0 = -lip_t - 0.2;
    translate([sx0 - 10, n0 + r]) square([stand_w + 20, 400]);
    hull() {
        translate([sx0 + r, n0 + r]) circle(r = r);
        translate([sx1 - r, n0 + r]) circle(r = r);
    }
}

module stand() {
    difference() {
        intersection() {
            profile_solid();
            in_dev() rotate([90, 0, 0])
                linear_extrude(height = 400, center = true) top_round_2d();
            translate([0, 0, -1]) linear_extrude(height = bed) foot_round_2d();
            in_dev() translate([0, 0, -300]) linear_extrude(height = 600) front_round_2d();
        }
        // Steckerschacht mit Fase hinten (R4, R6, R12)
        in_dev() translate([port_x - shaft_l / 2, 0, 0]) rotate([90, 0, 90])
            linear_extrude(height = shaft_l) polygon(SHAFT_NU);
        // Kabelkanal nach hinten, oben offen (R7)
        translate([channel_x - channel_w / 2, channel_y0, channel_z0])
            cube([channel_w, base_d + 1 - channel_y0, bed]);
        // Popsocket-Tasche, oben offen, unten rund (R8)
        in_dev() {
            translate([pop_x, slot_w - 1, pop_u]) rotate([-90, 0, 0])
                cylinder(d = pocket_w, h = pocket_dep + 1);
            translate([pocket_x0, slot_w - 1, pop_u])
                cube([pocket_w, pocket_dep + 1, dev_h]);
        }
    }
}

// Dummies (nicht gedruckt)
module device(g = 0) {
    in_dev() {
        translate([g, n_dev0 + g, g]) cube([dev_w - 2 * g, dev_t - 2 * g, dev_h - 2 * g]);
        translate([pop_x, slot_w + g, pop_u]) rotate([-90, 0, 0])
            cylinder(d = pop_d, h = pop_h - g);
    }
}
module plug() {
    in_dev() translate([port_x - plug_w / 2, n_plug - plug_t / 2, -plug_l])
        cube([plug_w, plug_t, plug_l]);
}
module cable() {
    in_dev() translate([port_x, n_plug, cab_u]) rotate([0, 90, 0])
        cylinder(d = cable_d, h = channel_x - port_x);
    translate([channel_x, cab_P[0], cab_P[1]]) sphere(d = cable_d);
    translate([channel_x, cab_P[0], cab_P[1]]) rotate([-90, 0, 0])
        cylinder(d = cable_d, h = base_d + 20 - cab_P[0]);
}

fx0 = port_x - shaft_l / 2 - 8;
fx1 = port_x + shaft_l / 2 + 8;
fz1 = F(-lip_t, lip_h)[1] + 3;
fy1 = F(n_rear, u_J)[0] + 3;
module fit_test() {
    intersection() {
        stand();
        translate([fx0, -1, -1]) cube([fx1 - fx0, fy1 + 1, fz1 + 1]);
    }
}

if (part == "print") {
    color(col_stand) translate([-sx0, 0, 0]) render(convexity = 6) stand();
} else if (part == "stand") {
    color(col_stand) render(convexity = 6) stand();
} else if (part == "fit_test") {
    color(col_stand) translate([-fx0, 0, 0]) render(convexity = 6) fit_test();
} else if (part == "assembly") {
    color(col_stand) render(convexity = 6) stand();
    color("Gray", 0.6) device();
    color("White") plug();
    color("DimGray") cable();
} else if (part == "interference") {
    // Kontakt Gerät/Auflage/Stütze ist gewollt -> Dummies um 0.05 geschrumpft
    intersection() {
        stand();
        union() { device(0.05); plug(); cable(); }
    }
}
